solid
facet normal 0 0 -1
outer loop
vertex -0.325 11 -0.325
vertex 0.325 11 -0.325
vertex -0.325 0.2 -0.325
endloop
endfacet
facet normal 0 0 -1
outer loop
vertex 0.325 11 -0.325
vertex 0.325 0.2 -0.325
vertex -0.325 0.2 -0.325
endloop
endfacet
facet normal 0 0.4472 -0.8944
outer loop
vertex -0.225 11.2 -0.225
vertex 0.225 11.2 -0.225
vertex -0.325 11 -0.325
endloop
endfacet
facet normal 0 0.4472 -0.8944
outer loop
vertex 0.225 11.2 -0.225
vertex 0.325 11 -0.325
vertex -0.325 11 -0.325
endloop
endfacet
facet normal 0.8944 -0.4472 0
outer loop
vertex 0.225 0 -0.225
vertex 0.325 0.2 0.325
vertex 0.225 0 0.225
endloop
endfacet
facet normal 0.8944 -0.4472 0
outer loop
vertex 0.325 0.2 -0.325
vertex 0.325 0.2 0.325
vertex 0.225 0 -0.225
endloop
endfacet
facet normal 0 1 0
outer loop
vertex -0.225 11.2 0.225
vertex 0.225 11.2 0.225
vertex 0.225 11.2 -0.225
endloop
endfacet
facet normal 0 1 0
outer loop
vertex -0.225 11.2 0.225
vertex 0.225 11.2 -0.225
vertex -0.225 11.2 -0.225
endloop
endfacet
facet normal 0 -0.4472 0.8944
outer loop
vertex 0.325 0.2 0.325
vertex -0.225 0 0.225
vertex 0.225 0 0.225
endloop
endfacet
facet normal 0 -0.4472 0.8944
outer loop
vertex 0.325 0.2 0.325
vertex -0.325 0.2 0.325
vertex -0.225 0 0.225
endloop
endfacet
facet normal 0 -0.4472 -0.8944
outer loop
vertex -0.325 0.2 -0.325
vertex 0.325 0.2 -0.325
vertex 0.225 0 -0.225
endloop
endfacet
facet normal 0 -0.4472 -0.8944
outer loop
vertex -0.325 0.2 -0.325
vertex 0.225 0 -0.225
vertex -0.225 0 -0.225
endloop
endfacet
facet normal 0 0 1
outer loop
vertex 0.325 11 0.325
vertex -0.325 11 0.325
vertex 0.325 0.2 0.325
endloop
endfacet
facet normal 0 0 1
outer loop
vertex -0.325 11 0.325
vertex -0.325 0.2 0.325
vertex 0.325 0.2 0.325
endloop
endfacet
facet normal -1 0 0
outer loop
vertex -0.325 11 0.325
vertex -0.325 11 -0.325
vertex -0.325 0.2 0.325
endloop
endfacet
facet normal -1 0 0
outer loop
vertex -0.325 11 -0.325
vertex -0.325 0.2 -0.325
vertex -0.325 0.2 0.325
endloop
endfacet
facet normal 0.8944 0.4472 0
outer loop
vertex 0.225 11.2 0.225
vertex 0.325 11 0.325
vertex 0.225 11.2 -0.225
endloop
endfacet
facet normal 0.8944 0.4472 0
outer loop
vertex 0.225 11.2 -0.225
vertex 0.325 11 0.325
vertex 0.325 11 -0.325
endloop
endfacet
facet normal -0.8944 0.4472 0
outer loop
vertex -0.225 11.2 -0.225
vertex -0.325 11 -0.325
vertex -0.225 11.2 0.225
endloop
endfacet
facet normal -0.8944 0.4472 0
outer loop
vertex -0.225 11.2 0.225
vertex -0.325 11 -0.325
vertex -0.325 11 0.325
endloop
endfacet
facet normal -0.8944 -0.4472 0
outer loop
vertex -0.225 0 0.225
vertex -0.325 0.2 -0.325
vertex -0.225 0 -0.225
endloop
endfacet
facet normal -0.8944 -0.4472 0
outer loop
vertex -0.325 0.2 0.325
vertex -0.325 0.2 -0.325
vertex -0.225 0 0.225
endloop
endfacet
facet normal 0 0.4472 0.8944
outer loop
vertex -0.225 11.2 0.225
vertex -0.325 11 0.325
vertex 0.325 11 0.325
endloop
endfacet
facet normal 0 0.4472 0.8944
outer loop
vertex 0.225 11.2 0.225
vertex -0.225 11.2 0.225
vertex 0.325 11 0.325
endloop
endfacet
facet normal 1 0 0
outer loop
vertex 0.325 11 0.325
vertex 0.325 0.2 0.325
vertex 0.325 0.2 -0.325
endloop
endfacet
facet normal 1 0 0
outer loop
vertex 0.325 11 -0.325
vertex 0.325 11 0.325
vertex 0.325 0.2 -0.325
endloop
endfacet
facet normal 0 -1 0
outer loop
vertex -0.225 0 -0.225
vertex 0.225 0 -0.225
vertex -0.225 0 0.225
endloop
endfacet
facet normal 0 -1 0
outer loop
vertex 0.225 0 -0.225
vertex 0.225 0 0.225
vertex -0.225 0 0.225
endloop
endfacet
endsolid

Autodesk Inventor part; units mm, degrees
ref_plane "YZ Plane" through (0, 0, 0) normal (1, 0, 0) x (0, 1, 0)
ref_plane "XZ Plane" through (0, 0, 0) normal (0, 1, 0) x (-1, 0, 0)
ref_plane "XY Plane" through (0, 0, 0) normal (0, 0, 1) x (1, 0, 0)
sketch "Sketch1" plane through (0, 0, 0) normal (0, 1, 0) x (-1, 0, 0)
  line L0 (0.325, 0.325) -> (-0.325, 0.325)
  line L1 (-0.325, 0.325) -> (-0.325, -0.325)
  line L2 (-0.325, -0.325) -> (0.325, -0.325)
  line L3 (0.325, -0.325) -> (0.325, 0.325)
  point P0 (0, 0)
  point P1 (0, -0.325)
  point P2 (-0.325, 0)
  dimension "d0" = 0.65
  dimension "d1" = 0.65
extrude "Extrusion1" add sketch "Sketch1" along normal blind 11.2
chamfer "Chamfer1" distance 0.1 distance2 0.2 1 edges at (0.325, 0, 0) measured on face at (0.1083, 0, 0.1083)
chamfer "Chamfer2" distance 0.1 distance2 0.2 1 edges at (-0.325, 0, 0) measured on face at (0.0417, 0, 0.1083)
chamfer "Chamfer3" distance 0.1 distance2 0.2 1 edges at (0, 0, 0.325) measured on face at (0.075, 0, 0.1083)
chamfer "Chamfer4" distance 0.1 distance2 0.2 1 edges at (0, 0, -0.325) measured on face at (0.075, 0, 0.0417)
chamfer "Chamfer5" distance 0.1 distance2 0.2 1 edges at (0.325, 11.2, 0) measured on face at (0.1083, 11.2, 0.1083)
chamfer "Chamfer6" distance 0.1 distance2 0.2 1 edges at (-0.05, 11.2, 0.325) measured on face at (0.0417, 11.2, 0.1083)
chamfer "Chamfer7" distance 0.1 distance2 0.2 1 edges at (-0.325, 11.2, -0.05) measured on face at (-0.1417, 11.2, -0.1417)
chamfer "Chamfer8" distance 0.1 distance2 0.2 1 edges at (0, 11.2, -0.325) measured on face at (-0.075, 11.2, -0.1417)
equation "\"d1\" = d0"
properties part number "Pin male header straight - single" material "Brass, Soft Yellow"
